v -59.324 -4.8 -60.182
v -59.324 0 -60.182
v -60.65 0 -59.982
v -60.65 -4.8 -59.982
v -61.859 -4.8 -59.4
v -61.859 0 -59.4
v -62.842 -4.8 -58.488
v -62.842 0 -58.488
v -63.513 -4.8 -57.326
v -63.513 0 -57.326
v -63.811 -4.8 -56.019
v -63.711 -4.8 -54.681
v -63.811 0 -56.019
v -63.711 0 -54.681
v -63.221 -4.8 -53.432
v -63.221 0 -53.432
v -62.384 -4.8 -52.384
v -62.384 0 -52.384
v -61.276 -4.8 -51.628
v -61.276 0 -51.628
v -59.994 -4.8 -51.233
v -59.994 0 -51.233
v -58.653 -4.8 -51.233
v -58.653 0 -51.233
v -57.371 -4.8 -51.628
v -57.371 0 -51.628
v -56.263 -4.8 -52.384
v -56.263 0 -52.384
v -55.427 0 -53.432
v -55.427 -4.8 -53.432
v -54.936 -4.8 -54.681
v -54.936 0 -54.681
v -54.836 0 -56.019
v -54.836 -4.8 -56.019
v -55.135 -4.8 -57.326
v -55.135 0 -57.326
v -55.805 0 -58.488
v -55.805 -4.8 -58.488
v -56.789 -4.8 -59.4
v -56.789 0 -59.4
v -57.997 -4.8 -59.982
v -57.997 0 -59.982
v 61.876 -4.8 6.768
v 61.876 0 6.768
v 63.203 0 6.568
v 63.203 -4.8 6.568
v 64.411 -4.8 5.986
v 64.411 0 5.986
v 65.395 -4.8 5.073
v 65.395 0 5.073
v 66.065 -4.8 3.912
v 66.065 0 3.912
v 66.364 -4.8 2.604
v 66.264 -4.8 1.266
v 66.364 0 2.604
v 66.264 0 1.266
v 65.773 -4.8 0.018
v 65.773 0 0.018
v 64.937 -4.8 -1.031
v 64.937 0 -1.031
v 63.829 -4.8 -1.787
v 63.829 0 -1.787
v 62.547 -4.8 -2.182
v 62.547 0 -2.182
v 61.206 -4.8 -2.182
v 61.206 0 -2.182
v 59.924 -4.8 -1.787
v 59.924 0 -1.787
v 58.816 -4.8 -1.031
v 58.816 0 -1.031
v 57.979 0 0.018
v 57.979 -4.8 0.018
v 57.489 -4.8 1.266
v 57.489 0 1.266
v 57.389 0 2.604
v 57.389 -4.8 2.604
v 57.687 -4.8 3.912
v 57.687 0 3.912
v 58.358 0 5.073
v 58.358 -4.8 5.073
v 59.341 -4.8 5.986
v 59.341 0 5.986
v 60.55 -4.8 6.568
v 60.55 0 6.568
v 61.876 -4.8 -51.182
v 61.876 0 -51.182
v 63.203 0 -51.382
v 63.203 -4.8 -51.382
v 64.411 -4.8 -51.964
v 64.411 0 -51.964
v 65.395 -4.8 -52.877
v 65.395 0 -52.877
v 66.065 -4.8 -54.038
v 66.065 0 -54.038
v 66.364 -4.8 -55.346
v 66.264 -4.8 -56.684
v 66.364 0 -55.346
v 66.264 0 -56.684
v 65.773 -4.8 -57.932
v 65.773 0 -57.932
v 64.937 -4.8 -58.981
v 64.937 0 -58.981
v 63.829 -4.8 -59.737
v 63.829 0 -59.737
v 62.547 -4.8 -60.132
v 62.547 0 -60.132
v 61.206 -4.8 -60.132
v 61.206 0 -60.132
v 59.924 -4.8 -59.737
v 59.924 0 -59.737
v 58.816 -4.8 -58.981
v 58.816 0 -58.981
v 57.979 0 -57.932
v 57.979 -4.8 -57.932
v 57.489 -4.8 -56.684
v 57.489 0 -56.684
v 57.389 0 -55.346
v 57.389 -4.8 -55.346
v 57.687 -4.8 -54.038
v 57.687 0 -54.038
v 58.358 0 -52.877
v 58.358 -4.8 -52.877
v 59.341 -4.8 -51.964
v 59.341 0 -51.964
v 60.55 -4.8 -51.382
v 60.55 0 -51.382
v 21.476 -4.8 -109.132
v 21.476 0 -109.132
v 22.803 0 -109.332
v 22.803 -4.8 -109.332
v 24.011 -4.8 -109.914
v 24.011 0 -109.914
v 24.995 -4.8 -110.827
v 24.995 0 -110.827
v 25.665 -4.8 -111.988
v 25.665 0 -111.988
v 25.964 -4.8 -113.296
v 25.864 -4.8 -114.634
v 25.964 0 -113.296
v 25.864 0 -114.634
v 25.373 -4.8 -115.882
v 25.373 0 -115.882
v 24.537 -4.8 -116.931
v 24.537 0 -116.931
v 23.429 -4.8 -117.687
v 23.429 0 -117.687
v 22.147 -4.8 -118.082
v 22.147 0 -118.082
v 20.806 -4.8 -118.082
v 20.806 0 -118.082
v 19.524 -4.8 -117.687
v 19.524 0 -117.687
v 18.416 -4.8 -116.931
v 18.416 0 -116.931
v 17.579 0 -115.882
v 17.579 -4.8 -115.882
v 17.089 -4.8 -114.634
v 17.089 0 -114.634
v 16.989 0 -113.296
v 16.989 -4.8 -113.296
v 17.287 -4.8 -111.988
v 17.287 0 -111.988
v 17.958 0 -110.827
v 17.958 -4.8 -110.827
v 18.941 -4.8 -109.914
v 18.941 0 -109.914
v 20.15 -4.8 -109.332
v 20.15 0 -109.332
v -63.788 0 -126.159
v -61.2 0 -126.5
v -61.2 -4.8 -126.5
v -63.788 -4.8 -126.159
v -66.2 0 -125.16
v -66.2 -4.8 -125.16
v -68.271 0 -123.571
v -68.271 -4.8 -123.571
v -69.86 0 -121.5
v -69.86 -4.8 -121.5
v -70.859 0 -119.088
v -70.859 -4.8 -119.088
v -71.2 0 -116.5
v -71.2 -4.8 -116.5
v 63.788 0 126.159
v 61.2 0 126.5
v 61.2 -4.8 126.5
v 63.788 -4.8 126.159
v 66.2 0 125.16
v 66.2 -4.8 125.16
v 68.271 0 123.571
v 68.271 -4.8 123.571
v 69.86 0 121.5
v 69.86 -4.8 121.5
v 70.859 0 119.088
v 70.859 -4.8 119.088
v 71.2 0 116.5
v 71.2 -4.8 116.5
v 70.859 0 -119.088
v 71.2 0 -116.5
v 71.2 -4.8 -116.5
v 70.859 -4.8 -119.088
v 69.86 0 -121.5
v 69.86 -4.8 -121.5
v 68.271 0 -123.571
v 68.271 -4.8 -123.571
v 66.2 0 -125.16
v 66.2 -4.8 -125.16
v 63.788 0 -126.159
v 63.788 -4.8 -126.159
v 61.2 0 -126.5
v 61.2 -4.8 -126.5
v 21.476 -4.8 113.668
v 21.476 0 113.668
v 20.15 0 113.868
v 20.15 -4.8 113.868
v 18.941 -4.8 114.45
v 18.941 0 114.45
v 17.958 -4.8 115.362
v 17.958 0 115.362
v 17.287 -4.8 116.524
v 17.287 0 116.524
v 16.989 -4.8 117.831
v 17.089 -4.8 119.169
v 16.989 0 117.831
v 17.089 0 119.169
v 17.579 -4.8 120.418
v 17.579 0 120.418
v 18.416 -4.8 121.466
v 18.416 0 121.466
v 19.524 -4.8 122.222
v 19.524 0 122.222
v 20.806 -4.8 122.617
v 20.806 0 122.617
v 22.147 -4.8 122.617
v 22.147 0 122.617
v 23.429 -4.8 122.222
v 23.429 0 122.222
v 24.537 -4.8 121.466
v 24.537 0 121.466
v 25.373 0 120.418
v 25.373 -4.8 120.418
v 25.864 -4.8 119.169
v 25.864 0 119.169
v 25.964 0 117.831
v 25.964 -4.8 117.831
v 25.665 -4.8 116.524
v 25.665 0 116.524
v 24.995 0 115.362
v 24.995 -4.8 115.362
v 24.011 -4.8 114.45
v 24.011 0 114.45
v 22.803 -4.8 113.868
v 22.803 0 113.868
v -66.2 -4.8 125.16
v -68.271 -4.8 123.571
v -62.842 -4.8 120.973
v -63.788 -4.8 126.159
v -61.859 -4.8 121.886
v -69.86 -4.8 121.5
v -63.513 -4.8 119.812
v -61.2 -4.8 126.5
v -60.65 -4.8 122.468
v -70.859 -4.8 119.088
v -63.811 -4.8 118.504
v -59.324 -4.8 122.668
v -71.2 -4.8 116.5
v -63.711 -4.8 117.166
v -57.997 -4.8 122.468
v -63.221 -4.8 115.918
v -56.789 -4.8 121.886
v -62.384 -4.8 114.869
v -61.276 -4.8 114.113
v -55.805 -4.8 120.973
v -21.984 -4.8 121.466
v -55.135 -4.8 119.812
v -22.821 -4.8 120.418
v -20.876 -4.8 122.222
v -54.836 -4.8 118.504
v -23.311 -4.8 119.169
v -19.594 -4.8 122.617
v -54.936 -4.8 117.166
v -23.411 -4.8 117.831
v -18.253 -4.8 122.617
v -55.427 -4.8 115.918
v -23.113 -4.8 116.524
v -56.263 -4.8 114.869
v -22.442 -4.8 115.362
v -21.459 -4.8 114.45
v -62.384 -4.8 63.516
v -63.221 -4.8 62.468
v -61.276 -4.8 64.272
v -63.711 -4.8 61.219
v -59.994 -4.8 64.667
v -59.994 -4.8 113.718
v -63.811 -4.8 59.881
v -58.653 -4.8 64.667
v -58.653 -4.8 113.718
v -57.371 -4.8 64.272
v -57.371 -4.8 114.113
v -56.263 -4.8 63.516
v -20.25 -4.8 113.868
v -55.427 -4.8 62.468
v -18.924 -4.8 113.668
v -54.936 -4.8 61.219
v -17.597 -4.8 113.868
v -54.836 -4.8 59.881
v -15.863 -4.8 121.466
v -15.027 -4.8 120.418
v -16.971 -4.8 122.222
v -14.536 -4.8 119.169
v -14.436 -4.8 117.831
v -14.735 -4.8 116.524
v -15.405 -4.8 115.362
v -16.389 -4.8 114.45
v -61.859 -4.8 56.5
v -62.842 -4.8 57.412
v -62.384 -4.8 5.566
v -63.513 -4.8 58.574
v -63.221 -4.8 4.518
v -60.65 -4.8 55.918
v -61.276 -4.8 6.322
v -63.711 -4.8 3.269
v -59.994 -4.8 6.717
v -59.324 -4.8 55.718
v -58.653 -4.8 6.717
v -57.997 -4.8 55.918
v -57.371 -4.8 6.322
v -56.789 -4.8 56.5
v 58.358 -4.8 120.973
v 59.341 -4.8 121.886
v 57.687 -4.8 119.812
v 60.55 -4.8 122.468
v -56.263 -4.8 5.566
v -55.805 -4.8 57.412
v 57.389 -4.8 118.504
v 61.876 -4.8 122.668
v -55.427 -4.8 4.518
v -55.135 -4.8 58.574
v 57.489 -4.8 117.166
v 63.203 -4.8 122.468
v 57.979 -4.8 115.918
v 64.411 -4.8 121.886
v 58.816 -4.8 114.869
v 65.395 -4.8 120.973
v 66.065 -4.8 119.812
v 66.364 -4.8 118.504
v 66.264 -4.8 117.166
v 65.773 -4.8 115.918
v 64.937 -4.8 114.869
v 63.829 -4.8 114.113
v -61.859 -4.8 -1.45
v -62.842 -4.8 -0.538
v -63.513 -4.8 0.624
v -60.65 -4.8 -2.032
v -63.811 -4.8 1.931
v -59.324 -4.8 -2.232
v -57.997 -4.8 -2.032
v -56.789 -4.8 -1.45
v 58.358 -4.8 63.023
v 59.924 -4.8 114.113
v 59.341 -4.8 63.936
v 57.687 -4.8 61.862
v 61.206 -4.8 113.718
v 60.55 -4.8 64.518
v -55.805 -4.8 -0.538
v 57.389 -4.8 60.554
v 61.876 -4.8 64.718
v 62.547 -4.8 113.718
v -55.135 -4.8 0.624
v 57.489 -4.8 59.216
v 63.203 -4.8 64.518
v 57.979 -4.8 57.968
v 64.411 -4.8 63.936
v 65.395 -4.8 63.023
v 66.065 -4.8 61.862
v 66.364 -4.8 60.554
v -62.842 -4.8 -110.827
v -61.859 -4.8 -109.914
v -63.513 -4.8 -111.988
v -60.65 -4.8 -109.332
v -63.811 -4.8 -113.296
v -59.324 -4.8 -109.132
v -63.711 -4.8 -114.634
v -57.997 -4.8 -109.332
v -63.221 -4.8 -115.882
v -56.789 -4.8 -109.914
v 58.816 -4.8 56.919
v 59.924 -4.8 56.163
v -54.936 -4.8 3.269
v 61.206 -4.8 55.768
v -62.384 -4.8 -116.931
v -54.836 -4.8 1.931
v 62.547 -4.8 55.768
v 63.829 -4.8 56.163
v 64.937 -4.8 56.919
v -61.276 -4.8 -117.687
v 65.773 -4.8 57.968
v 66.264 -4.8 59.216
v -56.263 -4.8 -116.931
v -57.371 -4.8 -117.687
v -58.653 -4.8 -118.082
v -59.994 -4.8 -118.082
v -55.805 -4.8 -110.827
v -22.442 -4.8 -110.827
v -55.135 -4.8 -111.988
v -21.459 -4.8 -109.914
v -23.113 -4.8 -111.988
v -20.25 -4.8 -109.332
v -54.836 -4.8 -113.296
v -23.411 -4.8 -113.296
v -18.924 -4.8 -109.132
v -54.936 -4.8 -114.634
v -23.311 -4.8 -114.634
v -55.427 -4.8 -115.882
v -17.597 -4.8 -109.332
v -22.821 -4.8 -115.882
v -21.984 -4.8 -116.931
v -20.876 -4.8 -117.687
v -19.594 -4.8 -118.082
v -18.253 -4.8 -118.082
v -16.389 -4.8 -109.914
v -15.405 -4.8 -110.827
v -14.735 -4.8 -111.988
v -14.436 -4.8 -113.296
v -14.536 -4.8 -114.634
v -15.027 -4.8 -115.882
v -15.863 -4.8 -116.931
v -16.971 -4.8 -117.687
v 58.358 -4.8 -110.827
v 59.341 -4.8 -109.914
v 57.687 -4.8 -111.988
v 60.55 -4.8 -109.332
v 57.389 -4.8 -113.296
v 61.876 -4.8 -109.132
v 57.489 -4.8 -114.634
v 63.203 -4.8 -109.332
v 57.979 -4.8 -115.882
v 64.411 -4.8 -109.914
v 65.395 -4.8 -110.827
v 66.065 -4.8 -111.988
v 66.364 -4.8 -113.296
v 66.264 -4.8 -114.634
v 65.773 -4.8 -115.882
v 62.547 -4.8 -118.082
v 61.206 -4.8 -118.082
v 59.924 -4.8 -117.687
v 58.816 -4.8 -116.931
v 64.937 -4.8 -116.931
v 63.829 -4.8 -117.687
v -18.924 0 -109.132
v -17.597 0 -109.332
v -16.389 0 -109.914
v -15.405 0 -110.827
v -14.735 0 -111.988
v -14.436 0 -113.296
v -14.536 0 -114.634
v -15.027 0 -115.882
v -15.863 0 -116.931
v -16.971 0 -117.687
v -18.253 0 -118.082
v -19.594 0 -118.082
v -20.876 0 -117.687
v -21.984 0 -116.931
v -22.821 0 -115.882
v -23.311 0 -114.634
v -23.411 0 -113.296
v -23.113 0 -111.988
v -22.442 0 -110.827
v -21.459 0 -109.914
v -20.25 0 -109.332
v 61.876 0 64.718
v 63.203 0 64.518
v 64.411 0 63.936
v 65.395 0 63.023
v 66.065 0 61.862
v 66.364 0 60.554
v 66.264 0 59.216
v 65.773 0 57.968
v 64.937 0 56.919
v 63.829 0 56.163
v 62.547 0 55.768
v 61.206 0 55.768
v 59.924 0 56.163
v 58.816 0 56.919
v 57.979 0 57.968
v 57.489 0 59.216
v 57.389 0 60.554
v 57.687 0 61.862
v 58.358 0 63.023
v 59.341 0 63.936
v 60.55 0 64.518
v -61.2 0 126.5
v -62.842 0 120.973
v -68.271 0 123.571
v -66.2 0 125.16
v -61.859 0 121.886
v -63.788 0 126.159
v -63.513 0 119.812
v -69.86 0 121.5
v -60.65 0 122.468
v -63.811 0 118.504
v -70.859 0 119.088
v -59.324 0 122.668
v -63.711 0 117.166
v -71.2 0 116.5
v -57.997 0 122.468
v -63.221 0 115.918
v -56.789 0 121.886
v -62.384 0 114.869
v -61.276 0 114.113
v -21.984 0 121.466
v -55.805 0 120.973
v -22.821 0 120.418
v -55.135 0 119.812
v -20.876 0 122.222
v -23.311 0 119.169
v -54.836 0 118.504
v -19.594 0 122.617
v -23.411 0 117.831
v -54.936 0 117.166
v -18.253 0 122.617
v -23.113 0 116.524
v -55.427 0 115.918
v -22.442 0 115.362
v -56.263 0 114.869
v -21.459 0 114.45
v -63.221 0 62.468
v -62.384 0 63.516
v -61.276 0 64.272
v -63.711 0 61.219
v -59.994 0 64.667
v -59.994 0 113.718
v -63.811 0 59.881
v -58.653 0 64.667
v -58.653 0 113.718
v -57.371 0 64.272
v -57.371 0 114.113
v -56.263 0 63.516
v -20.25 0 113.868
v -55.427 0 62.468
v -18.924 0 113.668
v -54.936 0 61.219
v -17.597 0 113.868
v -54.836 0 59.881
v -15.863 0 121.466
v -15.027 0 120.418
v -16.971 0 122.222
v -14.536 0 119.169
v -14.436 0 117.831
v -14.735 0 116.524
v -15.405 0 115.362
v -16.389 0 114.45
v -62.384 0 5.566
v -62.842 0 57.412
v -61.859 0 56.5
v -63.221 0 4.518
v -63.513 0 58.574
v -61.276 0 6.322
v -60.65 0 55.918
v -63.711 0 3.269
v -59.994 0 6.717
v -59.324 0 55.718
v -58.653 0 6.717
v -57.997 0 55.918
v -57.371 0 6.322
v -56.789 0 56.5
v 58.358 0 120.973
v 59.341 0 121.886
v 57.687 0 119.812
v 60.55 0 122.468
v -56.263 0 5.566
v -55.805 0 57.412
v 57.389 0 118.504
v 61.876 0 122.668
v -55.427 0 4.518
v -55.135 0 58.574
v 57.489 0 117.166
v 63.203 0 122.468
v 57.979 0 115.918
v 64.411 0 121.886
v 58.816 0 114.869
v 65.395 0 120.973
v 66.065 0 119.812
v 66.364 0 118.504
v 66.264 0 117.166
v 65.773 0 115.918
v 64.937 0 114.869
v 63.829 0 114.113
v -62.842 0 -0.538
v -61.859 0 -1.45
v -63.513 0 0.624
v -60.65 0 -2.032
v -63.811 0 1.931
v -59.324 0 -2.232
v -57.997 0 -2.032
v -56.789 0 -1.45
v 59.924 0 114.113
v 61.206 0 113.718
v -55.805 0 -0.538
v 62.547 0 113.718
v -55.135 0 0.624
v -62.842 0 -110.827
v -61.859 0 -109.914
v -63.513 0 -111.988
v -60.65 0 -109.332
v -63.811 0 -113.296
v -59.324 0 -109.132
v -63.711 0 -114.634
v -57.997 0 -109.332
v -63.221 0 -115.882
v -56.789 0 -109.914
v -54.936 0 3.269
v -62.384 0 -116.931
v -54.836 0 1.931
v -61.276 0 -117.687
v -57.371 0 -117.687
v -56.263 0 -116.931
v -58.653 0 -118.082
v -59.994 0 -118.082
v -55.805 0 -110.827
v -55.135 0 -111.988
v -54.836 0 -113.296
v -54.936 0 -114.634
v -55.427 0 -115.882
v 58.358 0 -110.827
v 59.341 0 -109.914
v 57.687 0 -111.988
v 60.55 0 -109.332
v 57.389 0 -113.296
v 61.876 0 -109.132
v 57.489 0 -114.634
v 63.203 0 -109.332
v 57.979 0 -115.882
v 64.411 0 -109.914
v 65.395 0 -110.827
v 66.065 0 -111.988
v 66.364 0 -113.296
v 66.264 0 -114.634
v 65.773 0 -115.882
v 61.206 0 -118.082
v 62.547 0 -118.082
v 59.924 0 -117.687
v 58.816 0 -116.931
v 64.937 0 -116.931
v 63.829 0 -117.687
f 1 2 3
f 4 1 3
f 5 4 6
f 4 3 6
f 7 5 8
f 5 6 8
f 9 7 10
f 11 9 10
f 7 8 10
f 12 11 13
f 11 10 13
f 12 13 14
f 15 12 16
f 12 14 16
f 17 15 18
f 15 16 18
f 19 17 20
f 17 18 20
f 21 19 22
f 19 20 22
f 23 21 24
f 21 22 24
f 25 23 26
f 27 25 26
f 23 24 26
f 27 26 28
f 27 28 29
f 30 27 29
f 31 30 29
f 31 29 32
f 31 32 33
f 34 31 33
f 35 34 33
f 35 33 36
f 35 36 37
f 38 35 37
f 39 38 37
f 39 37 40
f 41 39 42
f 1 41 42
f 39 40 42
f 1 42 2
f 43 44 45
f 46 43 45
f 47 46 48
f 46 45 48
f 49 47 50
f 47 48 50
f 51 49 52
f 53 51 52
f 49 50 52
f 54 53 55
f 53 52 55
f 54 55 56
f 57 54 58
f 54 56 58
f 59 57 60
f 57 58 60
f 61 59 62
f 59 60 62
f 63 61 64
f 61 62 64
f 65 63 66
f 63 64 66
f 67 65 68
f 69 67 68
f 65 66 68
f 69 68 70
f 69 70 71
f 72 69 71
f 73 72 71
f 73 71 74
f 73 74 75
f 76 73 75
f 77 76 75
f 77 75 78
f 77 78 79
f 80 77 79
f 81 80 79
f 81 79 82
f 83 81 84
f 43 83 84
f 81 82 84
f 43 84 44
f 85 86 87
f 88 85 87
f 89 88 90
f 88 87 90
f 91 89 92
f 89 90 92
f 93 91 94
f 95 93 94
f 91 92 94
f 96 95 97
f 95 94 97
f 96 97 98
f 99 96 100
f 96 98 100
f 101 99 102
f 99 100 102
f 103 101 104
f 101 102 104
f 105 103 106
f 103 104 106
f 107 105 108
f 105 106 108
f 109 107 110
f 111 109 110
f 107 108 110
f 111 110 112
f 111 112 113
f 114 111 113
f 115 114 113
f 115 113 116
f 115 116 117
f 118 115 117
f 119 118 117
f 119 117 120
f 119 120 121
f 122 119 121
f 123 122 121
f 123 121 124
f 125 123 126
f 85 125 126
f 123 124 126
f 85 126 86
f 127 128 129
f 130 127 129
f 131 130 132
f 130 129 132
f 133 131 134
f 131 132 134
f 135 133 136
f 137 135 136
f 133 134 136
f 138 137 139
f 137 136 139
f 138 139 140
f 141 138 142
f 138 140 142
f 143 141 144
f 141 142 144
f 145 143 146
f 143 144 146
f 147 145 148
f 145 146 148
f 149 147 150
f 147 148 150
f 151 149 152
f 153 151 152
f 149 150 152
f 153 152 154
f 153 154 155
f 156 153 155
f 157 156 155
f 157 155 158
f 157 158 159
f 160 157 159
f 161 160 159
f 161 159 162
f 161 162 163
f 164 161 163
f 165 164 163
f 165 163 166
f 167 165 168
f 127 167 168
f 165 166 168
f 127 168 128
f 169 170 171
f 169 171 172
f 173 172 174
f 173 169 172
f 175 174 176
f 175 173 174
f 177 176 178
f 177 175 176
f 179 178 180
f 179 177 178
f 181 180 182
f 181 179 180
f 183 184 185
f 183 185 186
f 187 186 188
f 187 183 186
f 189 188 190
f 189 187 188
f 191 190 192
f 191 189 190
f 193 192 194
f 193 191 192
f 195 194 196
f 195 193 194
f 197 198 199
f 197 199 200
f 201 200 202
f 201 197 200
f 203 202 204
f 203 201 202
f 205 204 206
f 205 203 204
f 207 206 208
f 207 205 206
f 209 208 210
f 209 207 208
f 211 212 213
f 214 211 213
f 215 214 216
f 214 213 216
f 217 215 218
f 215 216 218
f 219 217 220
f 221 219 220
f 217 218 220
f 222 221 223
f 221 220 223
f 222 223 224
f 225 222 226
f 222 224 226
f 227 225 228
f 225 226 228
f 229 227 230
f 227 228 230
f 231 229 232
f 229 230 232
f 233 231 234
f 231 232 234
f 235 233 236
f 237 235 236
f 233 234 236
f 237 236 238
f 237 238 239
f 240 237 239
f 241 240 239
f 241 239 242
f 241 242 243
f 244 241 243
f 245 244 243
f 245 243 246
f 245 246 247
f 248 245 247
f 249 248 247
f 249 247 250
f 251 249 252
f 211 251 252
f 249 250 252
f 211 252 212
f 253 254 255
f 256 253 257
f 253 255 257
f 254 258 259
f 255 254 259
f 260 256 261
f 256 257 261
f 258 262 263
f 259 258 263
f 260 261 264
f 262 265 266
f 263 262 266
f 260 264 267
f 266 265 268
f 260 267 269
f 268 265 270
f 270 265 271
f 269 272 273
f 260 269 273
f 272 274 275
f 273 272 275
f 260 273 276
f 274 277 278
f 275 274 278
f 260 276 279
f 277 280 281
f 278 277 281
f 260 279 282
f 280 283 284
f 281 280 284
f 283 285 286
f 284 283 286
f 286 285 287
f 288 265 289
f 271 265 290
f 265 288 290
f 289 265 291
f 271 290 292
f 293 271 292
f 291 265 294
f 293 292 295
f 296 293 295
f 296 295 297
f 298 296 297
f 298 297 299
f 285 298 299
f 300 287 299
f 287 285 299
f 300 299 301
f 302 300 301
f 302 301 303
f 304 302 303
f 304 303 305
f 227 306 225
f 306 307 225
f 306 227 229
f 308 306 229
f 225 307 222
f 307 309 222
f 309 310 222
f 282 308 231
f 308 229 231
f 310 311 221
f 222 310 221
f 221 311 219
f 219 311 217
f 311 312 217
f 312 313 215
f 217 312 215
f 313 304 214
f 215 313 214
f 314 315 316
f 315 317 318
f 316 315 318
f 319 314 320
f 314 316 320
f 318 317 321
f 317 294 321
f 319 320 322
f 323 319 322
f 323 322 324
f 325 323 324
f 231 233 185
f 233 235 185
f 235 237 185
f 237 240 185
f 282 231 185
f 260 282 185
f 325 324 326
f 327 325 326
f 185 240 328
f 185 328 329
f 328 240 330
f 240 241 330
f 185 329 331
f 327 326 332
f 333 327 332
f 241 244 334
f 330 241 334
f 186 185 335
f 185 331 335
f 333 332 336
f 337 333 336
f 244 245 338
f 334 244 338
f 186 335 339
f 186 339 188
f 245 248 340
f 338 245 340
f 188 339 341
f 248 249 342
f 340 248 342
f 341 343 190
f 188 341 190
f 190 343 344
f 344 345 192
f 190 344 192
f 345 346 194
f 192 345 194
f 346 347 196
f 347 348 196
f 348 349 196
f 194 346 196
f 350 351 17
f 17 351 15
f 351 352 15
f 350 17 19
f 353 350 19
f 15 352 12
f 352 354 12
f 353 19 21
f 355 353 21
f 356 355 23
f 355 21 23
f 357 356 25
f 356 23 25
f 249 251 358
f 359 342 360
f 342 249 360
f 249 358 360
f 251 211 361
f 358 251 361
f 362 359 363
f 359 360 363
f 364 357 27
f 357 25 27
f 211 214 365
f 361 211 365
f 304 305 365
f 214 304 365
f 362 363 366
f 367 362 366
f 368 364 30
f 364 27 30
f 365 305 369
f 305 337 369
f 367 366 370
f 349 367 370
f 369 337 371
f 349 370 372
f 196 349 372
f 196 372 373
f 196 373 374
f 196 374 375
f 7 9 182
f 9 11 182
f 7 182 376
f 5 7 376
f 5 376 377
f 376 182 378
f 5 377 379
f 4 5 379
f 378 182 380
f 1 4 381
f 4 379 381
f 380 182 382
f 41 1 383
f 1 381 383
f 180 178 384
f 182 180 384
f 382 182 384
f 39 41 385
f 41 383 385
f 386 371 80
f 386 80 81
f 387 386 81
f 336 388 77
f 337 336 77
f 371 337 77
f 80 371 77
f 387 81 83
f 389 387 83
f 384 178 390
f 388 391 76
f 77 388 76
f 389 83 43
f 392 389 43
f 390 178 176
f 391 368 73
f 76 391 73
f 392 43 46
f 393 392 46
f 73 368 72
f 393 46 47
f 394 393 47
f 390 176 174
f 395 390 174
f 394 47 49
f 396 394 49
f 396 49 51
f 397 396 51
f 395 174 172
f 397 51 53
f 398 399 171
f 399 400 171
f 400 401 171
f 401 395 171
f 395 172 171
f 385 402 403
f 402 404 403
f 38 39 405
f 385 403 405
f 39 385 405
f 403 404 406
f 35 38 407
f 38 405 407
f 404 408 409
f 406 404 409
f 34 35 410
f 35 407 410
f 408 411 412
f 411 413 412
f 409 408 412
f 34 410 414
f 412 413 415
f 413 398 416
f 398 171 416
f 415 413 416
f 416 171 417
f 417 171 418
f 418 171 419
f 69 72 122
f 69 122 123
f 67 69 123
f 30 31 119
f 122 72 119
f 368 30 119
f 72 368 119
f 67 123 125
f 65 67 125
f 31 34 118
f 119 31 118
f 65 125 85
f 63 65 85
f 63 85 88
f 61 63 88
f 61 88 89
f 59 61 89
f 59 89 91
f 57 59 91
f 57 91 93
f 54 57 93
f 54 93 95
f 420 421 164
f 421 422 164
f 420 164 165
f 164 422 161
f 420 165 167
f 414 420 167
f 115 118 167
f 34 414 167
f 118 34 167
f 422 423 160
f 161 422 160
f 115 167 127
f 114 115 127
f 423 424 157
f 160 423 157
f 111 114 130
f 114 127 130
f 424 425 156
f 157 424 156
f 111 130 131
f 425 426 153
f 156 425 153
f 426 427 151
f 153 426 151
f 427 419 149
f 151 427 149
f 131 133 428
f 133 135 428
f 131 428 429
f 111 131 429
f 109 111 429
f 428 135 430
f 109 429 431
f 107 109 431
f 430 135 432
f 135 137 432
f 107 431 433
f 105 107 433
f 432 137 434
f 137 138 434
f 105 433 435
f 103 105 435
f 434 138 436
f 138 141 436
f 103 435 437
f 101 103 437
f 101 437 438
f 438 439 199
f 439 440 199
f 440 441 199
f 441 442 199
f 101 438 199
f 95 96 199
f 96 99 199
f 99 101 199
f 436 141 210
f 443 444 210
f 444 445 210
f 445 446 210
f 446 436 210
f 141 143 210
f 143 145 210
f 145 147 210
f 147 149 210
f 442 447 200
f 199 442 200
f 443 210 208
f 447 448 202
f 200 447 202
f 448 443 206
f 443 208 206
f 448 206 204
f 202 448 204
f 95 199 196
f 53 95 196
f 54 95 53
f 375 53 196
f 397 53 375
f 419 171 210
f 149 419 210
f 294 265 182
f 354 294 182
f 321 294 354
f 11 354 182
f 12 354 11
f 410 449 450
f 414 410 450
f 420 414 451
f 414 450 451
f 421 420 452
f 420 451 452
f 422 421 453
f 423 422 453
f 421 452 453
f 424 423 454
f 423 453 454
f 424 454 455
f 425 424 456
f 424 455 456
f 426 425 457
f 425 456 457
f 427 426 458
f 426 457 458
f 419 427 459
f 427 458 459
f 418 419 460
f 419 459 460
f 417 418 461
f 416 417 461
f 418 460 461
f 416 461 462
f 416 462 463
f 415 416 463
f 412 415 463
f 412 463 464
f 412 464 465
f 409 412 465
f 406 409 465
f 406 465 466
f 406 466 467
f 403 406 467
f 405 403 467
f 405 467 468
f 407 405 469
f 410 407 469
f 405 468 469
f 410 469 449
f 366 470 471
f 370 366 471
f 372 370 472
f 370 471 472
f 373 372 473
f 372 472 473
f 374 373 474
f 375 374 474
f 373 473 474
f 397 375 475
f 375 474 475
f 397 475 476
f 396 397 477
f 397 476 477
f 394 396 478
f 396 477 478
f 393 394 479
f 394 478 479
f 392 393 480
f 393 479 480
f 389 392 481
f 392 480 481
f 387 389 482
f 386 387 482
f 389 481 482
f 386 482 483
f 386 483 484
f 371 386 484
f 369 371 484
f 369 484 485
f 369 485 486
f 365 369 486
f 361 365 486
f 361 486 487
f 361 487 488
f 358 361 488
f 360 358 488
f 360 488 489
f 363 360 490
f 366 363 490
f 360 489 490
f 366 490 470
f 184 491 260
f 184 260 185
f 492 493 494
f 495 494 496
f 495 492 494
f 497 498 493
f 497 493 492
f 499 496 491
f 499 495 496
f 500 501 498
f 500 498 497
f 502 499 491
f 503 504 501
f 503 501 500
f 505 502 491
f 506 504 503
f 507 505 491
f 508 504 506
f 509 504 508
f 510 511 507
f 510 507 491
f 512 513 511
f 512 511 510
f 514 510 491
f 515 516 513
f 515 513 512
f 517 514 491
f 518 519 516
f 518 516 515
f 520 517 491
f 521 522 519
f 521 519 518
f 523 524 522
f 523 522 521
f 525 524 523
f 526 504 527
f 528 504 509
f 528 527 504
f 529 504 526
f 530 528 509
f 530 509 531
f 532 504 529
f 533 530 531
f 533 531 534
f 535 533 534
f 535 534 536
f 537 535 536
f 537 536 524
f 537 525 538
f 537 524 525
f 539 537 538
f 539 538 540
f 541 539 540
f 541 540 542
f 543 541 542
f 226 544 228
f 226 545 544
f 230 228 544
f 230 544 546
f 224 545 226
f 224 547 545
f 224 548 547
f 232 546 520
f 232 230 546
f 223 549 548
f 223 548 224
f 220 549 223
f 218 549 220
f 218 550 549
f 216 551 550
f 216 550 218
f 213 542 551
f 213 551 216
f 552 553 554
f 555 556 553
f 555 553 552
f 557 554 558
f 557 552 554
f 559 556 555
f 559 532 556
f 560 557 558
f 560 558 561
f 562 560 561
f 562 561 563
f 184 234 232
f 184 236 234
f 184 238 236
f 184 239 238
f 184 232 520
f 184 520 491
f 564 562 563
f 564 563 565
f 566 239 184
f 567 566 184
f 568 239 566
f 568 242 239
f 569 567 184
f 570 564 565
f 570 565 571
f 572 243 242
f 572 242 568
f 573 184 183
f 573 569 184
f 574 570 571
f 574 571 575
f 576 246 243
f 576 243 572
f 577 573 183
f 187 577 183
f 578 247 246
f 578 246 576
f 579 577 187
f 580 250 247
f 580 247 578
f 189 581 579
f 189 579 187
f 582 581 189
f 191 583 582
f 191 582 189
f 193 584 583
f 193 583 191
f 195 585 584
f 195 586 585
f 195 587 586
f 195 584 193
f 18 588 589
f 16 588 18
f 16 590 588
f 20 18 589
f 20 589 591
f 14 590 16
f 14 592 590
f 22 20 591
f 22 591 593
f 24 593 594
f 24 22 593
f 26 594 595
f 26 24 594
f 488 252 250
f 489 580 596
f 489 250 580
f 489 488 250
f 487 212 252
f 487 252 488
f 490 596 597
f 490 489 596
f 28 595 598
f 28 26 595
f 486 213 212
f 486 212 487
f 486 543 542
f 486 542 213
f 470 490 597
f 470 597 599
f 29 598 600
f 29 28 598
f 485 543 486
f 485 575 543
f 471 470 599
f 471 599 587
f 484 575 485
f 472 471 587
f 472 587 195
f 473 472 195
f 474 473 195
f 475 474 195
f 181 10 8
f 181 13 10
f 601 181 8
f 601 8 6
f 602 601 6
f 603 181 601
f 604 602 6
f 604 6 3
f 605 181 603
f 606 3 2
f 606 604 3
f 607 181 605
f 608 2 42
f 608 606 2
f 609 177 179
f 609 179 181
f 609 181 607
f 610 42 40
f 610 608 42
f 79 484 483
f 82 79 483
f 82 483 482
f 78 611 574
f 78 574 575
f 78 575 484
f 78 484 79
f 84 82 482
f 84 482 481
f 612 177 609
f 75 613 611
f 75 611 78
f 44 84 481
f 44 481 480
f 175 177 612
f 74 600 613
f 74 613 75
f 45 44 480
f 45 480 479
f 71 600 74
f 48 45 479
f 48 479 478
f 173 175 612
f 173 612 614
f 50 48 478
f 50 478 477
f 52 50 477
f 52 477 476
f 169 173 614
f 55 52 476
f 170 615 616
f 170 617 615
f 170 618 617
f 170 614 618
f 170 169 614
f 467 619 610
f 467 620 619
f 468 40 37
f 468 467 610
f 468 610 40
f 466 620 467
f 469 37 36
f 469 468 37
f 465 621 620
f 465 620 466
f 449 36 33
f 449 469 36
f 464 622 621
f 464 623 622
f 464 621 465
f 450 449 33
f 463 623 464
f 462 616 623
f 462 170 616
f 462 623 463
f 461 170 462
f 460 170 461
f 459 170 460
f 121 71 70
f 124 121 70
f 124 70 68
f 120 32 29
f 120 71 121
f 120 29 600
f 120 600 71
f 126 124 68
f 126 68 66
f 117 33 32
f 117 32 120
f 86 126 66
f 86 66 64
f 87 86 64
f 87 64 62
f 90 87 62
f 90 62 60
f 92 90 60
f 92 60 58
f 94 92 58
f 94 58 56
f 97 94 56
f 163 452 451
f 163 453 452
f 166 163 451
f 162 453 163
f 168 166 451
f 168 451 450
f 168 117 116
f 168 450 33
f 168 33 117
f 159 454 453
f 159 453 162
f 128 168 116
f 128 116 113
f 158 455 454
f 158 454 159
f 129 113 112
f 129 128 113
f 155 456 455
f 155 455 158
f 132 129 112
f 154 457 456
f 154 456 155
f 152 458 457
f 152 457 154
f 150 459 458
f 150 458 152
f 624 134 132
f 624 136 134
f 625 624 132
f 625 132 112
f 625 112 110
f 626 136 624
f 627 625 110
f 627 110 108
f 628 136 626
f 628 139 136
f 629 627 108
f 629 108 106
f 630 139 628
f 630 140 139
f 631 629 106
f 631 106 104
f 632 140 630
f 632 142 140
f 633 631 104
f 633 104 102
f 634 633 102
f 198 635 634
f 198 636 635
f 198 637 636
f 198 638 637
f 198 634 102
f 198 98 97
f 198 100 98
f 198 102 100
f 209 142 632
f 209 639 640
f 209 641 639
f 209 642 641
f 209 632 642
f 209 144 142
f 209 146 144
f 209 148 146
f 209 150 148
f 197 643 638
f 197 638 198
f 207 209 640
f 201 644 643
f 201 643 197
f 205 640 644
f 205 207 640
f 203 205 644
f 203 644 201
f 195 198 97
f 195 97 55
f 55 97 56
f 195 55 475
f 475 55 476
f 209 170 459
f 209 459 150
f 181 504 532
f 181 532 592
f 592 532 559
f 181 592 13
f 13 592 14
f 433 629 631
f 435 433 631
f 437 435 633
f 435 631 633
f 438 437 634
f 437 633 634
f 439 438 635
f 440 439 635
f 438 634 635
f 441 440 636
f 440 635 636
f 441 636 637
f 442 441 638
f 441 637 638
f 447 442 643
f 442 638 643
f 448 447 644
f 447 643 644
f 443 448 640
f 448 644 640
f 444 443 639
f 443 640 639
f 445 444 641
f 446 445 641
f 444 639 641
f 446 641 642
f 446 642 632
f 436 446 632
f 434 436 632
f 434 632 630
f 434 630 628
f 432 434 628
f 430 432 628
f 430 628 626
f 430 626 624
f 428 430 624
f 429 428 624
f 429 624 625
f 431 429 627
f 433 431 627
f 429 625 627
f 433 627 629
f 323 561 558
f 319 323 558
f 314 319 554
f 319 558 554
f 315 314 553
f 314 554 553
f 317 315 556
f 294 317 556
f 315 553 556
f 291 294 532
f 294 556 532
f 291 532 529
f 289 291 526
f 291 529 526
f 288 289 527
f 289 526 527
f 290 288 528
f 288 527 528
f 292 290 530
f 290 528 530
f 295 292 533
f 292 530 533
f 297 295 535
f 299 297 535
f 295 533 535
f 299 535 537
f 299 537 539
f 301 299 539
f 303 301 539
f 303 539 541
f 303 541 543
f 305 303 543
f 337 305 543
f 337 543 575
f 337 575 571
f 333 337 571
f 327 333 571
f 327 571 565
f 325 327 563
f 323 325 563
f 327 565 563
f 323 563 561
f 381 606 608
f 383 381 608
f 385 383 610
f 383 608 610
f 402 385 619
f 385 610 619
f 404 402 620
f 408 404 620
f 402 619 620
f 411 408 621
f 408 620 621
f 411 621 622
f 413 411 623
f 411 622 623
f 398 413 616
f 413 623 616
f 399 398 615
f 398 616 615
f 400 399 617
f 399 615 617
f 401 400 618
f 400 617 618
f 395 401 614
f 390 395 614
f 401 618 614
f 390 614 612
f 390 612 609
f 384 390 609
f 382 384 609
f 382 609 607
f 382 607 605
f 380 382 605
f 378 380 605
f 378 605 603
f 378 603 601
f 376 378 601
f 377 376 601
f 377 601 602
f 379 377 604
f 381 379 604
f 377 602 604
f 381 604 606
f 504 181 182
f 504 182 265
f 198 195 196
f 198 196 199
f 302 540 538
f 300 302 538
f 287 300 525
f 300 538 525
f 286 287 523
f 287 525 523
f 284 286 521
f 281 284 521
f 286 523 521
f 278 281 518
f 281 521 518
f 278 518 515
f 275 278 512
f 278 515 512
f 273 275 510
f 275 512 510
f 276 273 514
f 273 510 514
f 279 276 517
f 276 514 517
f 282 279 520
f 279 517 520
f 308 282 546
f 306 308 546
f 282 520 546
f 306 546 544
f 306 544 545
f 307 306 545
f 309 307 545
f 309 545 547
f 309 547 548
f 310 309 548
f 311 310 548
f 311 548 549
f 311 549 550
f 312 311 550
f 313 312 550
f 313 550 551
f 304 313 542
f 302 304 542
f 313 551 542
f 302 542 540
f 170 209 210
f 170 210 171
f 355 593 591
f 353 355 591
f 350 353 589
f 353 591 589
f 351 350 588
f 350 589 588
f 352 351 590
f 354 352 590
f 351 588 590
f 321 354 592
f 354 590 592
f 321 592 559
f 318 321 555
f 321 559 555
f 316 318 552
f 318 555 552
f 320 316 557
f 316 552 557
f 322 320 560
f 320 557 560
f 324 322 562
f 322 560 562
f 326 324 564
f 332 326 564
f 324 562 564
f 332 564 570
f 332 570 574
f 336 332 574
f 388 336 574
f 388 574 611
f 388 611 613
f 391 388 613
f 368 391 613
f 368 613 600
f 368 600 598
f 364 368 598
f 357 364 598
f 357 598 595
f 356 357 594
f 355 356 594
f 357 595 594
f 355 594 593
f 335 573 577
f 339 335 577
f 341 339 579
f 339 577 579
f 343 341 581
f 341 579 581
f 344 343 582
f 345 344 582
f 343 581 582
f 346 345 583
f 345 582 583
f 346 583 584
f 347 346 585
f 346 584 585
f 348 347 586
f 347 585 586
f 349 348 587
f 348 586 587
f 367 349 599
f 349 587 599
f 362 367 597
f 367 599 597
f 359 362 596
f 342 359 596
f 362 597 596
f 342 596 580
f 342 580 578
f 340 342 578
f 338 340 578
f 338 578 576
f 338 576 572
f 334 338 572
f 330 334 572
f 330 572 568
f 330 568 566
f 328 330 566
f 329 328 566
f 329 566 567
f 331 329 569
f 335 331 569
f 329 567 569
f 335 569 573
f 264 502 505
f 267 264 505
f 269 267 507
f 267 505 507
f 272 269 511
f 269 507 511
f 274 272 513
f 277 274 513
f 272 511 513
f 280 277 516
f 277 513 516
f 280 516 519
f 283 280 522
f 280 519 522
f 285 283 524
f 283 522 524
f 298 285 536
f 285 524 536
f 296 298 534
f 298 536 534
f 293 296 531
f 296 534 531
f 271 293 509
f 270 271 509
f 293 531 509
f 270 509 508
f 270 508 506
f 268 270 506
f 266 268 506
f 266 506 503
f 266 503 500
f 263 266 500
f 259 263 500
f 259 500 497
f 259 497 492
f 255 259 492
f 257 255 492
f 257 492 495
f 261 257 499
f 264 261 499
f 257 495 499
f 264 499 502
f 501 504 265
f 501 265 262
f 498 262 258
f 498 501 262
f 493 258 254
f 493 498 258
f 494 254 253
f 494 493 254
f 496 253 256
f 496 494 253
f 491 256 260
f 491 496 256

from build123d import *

# Parameters (mm, degrees)
ESBO_O1_R          = 4.5
FLANGE_BASE1_DEPTH = 4.8


# Sheet-metal steps are written as plain solids
with BuildPart() as part:
    # Esboço1 → Flange-base1 (new body)
    with BuildSketch(Plane(origin=(0, 0, 0), x_dir=(1, 0, 0), z_dir=(0, 1, 0))):
        with BuildLine():
            Line((-61.2, -126.5), (61.2, -126.5))
            ThreePointArc((61.2, -126.5), (68.271067812, -123.571067812), (71.2, -116.5))
            Line((71.2, -116.5), (71.2, 116.5))
            ThreePointArc((71.2, 116.5), (68.271067812, 123.571067812), (61.2, 126.5))
            Line((61.2, 126.5), (-61.2, 126.5))
            ThreePointArc((-61.2, 126.5), (-68.271067812, 123.571067812), (-71.2, 116.5))
            Line((-71.2, 116.5), (-71.2, -116.5))
            ThreePointArc((-71.2, -116.5), (-68.271067812, -123.571067812), (-61.2, -126.5))
        make_face()
        with Locations(Location((-59.32366364, 113.632351832, 0), (0, 0, 270))):
            Circle(ESBO_O1_R, mode=Mode.SUBTRACT)
        with Locations(Location((61.87633636, 113.632351832, 0), (0, 0, 270))):
            Circle(ESBO_O1_R, mode=Mode.SUBTRACT)
        with Locations(Location((-59.32366364, -118.167648168, 0), (0, 0, 270))):
            Circle(ESBO_O1_R, mode=Mode.SUBTRACT)
        with Locations(Location((61.87633636, -118.167648168, 0), (0, 0, 270))):
            Circle(ESBO_O1_R, mode=Mode.SUBTRACT)
        with Locations(Location((-18.92366364, 113.632351832, 0), (0, 0, 270))):
            Circle(ESBO_O1_R, mode=Mode.SUBTRACT)
        with Locations(Location((21.47633636, 113.632351832, 0), (0, 0, 270))):
            Circle(ESBO_O1_R, mode=Mode.SUBTRACT)
        with Locations(Location((61.87633636, 55.682351832, 0), (0, 0, 270))):
            Circle(ESBO_O1_R, mode=Mode.SUBTRACT)
        with Locations(Location((61.87633636, -2.267648168, 0), (0, 0, 270))):
            Circle(ESBO_O1_R, mode=Mode.SUBTRACT)
        with Locations(Location((61.87633636, -60.217648168, 0), (0, 0, 270))):
            Circle(ESBO_O1_R, mode=Mode.SUBTRACT)
        with Locations(Location((21.47633636, -118.167648168, 0), (0, 0, 90))):
            Circle(ESBO_O1_R, mode=Mode.SUBTRACT)
        with Locations(Location((-18.92366364, -118.167648168, 0), (0, 0, 90))):
            Circle(ESBO_O1_R, mode=Mode.SUBTRACT)
        with Locations(Location((-59.32366364, -60.217648168, 0), (0, 0, 90))):
            Circle(ESBO_O1_R, mode=Mode.SUBTRACT)
        with Locations(Location((-59.32366364, -2.267648168, 0), (0, 0, 90))):
            Circle(ESBO_O1_R, mode=Mode.SUBTRACT)
        with Locations(Location((-59.32366364, 55.682351832, 0), (0, 0, 90))):
            Circle(ESBO_O1_R, mode=Mode.SUBTRACT)
    extrude(amount=-FLANGE_BASE1_DEPTH)


solid = part.part
